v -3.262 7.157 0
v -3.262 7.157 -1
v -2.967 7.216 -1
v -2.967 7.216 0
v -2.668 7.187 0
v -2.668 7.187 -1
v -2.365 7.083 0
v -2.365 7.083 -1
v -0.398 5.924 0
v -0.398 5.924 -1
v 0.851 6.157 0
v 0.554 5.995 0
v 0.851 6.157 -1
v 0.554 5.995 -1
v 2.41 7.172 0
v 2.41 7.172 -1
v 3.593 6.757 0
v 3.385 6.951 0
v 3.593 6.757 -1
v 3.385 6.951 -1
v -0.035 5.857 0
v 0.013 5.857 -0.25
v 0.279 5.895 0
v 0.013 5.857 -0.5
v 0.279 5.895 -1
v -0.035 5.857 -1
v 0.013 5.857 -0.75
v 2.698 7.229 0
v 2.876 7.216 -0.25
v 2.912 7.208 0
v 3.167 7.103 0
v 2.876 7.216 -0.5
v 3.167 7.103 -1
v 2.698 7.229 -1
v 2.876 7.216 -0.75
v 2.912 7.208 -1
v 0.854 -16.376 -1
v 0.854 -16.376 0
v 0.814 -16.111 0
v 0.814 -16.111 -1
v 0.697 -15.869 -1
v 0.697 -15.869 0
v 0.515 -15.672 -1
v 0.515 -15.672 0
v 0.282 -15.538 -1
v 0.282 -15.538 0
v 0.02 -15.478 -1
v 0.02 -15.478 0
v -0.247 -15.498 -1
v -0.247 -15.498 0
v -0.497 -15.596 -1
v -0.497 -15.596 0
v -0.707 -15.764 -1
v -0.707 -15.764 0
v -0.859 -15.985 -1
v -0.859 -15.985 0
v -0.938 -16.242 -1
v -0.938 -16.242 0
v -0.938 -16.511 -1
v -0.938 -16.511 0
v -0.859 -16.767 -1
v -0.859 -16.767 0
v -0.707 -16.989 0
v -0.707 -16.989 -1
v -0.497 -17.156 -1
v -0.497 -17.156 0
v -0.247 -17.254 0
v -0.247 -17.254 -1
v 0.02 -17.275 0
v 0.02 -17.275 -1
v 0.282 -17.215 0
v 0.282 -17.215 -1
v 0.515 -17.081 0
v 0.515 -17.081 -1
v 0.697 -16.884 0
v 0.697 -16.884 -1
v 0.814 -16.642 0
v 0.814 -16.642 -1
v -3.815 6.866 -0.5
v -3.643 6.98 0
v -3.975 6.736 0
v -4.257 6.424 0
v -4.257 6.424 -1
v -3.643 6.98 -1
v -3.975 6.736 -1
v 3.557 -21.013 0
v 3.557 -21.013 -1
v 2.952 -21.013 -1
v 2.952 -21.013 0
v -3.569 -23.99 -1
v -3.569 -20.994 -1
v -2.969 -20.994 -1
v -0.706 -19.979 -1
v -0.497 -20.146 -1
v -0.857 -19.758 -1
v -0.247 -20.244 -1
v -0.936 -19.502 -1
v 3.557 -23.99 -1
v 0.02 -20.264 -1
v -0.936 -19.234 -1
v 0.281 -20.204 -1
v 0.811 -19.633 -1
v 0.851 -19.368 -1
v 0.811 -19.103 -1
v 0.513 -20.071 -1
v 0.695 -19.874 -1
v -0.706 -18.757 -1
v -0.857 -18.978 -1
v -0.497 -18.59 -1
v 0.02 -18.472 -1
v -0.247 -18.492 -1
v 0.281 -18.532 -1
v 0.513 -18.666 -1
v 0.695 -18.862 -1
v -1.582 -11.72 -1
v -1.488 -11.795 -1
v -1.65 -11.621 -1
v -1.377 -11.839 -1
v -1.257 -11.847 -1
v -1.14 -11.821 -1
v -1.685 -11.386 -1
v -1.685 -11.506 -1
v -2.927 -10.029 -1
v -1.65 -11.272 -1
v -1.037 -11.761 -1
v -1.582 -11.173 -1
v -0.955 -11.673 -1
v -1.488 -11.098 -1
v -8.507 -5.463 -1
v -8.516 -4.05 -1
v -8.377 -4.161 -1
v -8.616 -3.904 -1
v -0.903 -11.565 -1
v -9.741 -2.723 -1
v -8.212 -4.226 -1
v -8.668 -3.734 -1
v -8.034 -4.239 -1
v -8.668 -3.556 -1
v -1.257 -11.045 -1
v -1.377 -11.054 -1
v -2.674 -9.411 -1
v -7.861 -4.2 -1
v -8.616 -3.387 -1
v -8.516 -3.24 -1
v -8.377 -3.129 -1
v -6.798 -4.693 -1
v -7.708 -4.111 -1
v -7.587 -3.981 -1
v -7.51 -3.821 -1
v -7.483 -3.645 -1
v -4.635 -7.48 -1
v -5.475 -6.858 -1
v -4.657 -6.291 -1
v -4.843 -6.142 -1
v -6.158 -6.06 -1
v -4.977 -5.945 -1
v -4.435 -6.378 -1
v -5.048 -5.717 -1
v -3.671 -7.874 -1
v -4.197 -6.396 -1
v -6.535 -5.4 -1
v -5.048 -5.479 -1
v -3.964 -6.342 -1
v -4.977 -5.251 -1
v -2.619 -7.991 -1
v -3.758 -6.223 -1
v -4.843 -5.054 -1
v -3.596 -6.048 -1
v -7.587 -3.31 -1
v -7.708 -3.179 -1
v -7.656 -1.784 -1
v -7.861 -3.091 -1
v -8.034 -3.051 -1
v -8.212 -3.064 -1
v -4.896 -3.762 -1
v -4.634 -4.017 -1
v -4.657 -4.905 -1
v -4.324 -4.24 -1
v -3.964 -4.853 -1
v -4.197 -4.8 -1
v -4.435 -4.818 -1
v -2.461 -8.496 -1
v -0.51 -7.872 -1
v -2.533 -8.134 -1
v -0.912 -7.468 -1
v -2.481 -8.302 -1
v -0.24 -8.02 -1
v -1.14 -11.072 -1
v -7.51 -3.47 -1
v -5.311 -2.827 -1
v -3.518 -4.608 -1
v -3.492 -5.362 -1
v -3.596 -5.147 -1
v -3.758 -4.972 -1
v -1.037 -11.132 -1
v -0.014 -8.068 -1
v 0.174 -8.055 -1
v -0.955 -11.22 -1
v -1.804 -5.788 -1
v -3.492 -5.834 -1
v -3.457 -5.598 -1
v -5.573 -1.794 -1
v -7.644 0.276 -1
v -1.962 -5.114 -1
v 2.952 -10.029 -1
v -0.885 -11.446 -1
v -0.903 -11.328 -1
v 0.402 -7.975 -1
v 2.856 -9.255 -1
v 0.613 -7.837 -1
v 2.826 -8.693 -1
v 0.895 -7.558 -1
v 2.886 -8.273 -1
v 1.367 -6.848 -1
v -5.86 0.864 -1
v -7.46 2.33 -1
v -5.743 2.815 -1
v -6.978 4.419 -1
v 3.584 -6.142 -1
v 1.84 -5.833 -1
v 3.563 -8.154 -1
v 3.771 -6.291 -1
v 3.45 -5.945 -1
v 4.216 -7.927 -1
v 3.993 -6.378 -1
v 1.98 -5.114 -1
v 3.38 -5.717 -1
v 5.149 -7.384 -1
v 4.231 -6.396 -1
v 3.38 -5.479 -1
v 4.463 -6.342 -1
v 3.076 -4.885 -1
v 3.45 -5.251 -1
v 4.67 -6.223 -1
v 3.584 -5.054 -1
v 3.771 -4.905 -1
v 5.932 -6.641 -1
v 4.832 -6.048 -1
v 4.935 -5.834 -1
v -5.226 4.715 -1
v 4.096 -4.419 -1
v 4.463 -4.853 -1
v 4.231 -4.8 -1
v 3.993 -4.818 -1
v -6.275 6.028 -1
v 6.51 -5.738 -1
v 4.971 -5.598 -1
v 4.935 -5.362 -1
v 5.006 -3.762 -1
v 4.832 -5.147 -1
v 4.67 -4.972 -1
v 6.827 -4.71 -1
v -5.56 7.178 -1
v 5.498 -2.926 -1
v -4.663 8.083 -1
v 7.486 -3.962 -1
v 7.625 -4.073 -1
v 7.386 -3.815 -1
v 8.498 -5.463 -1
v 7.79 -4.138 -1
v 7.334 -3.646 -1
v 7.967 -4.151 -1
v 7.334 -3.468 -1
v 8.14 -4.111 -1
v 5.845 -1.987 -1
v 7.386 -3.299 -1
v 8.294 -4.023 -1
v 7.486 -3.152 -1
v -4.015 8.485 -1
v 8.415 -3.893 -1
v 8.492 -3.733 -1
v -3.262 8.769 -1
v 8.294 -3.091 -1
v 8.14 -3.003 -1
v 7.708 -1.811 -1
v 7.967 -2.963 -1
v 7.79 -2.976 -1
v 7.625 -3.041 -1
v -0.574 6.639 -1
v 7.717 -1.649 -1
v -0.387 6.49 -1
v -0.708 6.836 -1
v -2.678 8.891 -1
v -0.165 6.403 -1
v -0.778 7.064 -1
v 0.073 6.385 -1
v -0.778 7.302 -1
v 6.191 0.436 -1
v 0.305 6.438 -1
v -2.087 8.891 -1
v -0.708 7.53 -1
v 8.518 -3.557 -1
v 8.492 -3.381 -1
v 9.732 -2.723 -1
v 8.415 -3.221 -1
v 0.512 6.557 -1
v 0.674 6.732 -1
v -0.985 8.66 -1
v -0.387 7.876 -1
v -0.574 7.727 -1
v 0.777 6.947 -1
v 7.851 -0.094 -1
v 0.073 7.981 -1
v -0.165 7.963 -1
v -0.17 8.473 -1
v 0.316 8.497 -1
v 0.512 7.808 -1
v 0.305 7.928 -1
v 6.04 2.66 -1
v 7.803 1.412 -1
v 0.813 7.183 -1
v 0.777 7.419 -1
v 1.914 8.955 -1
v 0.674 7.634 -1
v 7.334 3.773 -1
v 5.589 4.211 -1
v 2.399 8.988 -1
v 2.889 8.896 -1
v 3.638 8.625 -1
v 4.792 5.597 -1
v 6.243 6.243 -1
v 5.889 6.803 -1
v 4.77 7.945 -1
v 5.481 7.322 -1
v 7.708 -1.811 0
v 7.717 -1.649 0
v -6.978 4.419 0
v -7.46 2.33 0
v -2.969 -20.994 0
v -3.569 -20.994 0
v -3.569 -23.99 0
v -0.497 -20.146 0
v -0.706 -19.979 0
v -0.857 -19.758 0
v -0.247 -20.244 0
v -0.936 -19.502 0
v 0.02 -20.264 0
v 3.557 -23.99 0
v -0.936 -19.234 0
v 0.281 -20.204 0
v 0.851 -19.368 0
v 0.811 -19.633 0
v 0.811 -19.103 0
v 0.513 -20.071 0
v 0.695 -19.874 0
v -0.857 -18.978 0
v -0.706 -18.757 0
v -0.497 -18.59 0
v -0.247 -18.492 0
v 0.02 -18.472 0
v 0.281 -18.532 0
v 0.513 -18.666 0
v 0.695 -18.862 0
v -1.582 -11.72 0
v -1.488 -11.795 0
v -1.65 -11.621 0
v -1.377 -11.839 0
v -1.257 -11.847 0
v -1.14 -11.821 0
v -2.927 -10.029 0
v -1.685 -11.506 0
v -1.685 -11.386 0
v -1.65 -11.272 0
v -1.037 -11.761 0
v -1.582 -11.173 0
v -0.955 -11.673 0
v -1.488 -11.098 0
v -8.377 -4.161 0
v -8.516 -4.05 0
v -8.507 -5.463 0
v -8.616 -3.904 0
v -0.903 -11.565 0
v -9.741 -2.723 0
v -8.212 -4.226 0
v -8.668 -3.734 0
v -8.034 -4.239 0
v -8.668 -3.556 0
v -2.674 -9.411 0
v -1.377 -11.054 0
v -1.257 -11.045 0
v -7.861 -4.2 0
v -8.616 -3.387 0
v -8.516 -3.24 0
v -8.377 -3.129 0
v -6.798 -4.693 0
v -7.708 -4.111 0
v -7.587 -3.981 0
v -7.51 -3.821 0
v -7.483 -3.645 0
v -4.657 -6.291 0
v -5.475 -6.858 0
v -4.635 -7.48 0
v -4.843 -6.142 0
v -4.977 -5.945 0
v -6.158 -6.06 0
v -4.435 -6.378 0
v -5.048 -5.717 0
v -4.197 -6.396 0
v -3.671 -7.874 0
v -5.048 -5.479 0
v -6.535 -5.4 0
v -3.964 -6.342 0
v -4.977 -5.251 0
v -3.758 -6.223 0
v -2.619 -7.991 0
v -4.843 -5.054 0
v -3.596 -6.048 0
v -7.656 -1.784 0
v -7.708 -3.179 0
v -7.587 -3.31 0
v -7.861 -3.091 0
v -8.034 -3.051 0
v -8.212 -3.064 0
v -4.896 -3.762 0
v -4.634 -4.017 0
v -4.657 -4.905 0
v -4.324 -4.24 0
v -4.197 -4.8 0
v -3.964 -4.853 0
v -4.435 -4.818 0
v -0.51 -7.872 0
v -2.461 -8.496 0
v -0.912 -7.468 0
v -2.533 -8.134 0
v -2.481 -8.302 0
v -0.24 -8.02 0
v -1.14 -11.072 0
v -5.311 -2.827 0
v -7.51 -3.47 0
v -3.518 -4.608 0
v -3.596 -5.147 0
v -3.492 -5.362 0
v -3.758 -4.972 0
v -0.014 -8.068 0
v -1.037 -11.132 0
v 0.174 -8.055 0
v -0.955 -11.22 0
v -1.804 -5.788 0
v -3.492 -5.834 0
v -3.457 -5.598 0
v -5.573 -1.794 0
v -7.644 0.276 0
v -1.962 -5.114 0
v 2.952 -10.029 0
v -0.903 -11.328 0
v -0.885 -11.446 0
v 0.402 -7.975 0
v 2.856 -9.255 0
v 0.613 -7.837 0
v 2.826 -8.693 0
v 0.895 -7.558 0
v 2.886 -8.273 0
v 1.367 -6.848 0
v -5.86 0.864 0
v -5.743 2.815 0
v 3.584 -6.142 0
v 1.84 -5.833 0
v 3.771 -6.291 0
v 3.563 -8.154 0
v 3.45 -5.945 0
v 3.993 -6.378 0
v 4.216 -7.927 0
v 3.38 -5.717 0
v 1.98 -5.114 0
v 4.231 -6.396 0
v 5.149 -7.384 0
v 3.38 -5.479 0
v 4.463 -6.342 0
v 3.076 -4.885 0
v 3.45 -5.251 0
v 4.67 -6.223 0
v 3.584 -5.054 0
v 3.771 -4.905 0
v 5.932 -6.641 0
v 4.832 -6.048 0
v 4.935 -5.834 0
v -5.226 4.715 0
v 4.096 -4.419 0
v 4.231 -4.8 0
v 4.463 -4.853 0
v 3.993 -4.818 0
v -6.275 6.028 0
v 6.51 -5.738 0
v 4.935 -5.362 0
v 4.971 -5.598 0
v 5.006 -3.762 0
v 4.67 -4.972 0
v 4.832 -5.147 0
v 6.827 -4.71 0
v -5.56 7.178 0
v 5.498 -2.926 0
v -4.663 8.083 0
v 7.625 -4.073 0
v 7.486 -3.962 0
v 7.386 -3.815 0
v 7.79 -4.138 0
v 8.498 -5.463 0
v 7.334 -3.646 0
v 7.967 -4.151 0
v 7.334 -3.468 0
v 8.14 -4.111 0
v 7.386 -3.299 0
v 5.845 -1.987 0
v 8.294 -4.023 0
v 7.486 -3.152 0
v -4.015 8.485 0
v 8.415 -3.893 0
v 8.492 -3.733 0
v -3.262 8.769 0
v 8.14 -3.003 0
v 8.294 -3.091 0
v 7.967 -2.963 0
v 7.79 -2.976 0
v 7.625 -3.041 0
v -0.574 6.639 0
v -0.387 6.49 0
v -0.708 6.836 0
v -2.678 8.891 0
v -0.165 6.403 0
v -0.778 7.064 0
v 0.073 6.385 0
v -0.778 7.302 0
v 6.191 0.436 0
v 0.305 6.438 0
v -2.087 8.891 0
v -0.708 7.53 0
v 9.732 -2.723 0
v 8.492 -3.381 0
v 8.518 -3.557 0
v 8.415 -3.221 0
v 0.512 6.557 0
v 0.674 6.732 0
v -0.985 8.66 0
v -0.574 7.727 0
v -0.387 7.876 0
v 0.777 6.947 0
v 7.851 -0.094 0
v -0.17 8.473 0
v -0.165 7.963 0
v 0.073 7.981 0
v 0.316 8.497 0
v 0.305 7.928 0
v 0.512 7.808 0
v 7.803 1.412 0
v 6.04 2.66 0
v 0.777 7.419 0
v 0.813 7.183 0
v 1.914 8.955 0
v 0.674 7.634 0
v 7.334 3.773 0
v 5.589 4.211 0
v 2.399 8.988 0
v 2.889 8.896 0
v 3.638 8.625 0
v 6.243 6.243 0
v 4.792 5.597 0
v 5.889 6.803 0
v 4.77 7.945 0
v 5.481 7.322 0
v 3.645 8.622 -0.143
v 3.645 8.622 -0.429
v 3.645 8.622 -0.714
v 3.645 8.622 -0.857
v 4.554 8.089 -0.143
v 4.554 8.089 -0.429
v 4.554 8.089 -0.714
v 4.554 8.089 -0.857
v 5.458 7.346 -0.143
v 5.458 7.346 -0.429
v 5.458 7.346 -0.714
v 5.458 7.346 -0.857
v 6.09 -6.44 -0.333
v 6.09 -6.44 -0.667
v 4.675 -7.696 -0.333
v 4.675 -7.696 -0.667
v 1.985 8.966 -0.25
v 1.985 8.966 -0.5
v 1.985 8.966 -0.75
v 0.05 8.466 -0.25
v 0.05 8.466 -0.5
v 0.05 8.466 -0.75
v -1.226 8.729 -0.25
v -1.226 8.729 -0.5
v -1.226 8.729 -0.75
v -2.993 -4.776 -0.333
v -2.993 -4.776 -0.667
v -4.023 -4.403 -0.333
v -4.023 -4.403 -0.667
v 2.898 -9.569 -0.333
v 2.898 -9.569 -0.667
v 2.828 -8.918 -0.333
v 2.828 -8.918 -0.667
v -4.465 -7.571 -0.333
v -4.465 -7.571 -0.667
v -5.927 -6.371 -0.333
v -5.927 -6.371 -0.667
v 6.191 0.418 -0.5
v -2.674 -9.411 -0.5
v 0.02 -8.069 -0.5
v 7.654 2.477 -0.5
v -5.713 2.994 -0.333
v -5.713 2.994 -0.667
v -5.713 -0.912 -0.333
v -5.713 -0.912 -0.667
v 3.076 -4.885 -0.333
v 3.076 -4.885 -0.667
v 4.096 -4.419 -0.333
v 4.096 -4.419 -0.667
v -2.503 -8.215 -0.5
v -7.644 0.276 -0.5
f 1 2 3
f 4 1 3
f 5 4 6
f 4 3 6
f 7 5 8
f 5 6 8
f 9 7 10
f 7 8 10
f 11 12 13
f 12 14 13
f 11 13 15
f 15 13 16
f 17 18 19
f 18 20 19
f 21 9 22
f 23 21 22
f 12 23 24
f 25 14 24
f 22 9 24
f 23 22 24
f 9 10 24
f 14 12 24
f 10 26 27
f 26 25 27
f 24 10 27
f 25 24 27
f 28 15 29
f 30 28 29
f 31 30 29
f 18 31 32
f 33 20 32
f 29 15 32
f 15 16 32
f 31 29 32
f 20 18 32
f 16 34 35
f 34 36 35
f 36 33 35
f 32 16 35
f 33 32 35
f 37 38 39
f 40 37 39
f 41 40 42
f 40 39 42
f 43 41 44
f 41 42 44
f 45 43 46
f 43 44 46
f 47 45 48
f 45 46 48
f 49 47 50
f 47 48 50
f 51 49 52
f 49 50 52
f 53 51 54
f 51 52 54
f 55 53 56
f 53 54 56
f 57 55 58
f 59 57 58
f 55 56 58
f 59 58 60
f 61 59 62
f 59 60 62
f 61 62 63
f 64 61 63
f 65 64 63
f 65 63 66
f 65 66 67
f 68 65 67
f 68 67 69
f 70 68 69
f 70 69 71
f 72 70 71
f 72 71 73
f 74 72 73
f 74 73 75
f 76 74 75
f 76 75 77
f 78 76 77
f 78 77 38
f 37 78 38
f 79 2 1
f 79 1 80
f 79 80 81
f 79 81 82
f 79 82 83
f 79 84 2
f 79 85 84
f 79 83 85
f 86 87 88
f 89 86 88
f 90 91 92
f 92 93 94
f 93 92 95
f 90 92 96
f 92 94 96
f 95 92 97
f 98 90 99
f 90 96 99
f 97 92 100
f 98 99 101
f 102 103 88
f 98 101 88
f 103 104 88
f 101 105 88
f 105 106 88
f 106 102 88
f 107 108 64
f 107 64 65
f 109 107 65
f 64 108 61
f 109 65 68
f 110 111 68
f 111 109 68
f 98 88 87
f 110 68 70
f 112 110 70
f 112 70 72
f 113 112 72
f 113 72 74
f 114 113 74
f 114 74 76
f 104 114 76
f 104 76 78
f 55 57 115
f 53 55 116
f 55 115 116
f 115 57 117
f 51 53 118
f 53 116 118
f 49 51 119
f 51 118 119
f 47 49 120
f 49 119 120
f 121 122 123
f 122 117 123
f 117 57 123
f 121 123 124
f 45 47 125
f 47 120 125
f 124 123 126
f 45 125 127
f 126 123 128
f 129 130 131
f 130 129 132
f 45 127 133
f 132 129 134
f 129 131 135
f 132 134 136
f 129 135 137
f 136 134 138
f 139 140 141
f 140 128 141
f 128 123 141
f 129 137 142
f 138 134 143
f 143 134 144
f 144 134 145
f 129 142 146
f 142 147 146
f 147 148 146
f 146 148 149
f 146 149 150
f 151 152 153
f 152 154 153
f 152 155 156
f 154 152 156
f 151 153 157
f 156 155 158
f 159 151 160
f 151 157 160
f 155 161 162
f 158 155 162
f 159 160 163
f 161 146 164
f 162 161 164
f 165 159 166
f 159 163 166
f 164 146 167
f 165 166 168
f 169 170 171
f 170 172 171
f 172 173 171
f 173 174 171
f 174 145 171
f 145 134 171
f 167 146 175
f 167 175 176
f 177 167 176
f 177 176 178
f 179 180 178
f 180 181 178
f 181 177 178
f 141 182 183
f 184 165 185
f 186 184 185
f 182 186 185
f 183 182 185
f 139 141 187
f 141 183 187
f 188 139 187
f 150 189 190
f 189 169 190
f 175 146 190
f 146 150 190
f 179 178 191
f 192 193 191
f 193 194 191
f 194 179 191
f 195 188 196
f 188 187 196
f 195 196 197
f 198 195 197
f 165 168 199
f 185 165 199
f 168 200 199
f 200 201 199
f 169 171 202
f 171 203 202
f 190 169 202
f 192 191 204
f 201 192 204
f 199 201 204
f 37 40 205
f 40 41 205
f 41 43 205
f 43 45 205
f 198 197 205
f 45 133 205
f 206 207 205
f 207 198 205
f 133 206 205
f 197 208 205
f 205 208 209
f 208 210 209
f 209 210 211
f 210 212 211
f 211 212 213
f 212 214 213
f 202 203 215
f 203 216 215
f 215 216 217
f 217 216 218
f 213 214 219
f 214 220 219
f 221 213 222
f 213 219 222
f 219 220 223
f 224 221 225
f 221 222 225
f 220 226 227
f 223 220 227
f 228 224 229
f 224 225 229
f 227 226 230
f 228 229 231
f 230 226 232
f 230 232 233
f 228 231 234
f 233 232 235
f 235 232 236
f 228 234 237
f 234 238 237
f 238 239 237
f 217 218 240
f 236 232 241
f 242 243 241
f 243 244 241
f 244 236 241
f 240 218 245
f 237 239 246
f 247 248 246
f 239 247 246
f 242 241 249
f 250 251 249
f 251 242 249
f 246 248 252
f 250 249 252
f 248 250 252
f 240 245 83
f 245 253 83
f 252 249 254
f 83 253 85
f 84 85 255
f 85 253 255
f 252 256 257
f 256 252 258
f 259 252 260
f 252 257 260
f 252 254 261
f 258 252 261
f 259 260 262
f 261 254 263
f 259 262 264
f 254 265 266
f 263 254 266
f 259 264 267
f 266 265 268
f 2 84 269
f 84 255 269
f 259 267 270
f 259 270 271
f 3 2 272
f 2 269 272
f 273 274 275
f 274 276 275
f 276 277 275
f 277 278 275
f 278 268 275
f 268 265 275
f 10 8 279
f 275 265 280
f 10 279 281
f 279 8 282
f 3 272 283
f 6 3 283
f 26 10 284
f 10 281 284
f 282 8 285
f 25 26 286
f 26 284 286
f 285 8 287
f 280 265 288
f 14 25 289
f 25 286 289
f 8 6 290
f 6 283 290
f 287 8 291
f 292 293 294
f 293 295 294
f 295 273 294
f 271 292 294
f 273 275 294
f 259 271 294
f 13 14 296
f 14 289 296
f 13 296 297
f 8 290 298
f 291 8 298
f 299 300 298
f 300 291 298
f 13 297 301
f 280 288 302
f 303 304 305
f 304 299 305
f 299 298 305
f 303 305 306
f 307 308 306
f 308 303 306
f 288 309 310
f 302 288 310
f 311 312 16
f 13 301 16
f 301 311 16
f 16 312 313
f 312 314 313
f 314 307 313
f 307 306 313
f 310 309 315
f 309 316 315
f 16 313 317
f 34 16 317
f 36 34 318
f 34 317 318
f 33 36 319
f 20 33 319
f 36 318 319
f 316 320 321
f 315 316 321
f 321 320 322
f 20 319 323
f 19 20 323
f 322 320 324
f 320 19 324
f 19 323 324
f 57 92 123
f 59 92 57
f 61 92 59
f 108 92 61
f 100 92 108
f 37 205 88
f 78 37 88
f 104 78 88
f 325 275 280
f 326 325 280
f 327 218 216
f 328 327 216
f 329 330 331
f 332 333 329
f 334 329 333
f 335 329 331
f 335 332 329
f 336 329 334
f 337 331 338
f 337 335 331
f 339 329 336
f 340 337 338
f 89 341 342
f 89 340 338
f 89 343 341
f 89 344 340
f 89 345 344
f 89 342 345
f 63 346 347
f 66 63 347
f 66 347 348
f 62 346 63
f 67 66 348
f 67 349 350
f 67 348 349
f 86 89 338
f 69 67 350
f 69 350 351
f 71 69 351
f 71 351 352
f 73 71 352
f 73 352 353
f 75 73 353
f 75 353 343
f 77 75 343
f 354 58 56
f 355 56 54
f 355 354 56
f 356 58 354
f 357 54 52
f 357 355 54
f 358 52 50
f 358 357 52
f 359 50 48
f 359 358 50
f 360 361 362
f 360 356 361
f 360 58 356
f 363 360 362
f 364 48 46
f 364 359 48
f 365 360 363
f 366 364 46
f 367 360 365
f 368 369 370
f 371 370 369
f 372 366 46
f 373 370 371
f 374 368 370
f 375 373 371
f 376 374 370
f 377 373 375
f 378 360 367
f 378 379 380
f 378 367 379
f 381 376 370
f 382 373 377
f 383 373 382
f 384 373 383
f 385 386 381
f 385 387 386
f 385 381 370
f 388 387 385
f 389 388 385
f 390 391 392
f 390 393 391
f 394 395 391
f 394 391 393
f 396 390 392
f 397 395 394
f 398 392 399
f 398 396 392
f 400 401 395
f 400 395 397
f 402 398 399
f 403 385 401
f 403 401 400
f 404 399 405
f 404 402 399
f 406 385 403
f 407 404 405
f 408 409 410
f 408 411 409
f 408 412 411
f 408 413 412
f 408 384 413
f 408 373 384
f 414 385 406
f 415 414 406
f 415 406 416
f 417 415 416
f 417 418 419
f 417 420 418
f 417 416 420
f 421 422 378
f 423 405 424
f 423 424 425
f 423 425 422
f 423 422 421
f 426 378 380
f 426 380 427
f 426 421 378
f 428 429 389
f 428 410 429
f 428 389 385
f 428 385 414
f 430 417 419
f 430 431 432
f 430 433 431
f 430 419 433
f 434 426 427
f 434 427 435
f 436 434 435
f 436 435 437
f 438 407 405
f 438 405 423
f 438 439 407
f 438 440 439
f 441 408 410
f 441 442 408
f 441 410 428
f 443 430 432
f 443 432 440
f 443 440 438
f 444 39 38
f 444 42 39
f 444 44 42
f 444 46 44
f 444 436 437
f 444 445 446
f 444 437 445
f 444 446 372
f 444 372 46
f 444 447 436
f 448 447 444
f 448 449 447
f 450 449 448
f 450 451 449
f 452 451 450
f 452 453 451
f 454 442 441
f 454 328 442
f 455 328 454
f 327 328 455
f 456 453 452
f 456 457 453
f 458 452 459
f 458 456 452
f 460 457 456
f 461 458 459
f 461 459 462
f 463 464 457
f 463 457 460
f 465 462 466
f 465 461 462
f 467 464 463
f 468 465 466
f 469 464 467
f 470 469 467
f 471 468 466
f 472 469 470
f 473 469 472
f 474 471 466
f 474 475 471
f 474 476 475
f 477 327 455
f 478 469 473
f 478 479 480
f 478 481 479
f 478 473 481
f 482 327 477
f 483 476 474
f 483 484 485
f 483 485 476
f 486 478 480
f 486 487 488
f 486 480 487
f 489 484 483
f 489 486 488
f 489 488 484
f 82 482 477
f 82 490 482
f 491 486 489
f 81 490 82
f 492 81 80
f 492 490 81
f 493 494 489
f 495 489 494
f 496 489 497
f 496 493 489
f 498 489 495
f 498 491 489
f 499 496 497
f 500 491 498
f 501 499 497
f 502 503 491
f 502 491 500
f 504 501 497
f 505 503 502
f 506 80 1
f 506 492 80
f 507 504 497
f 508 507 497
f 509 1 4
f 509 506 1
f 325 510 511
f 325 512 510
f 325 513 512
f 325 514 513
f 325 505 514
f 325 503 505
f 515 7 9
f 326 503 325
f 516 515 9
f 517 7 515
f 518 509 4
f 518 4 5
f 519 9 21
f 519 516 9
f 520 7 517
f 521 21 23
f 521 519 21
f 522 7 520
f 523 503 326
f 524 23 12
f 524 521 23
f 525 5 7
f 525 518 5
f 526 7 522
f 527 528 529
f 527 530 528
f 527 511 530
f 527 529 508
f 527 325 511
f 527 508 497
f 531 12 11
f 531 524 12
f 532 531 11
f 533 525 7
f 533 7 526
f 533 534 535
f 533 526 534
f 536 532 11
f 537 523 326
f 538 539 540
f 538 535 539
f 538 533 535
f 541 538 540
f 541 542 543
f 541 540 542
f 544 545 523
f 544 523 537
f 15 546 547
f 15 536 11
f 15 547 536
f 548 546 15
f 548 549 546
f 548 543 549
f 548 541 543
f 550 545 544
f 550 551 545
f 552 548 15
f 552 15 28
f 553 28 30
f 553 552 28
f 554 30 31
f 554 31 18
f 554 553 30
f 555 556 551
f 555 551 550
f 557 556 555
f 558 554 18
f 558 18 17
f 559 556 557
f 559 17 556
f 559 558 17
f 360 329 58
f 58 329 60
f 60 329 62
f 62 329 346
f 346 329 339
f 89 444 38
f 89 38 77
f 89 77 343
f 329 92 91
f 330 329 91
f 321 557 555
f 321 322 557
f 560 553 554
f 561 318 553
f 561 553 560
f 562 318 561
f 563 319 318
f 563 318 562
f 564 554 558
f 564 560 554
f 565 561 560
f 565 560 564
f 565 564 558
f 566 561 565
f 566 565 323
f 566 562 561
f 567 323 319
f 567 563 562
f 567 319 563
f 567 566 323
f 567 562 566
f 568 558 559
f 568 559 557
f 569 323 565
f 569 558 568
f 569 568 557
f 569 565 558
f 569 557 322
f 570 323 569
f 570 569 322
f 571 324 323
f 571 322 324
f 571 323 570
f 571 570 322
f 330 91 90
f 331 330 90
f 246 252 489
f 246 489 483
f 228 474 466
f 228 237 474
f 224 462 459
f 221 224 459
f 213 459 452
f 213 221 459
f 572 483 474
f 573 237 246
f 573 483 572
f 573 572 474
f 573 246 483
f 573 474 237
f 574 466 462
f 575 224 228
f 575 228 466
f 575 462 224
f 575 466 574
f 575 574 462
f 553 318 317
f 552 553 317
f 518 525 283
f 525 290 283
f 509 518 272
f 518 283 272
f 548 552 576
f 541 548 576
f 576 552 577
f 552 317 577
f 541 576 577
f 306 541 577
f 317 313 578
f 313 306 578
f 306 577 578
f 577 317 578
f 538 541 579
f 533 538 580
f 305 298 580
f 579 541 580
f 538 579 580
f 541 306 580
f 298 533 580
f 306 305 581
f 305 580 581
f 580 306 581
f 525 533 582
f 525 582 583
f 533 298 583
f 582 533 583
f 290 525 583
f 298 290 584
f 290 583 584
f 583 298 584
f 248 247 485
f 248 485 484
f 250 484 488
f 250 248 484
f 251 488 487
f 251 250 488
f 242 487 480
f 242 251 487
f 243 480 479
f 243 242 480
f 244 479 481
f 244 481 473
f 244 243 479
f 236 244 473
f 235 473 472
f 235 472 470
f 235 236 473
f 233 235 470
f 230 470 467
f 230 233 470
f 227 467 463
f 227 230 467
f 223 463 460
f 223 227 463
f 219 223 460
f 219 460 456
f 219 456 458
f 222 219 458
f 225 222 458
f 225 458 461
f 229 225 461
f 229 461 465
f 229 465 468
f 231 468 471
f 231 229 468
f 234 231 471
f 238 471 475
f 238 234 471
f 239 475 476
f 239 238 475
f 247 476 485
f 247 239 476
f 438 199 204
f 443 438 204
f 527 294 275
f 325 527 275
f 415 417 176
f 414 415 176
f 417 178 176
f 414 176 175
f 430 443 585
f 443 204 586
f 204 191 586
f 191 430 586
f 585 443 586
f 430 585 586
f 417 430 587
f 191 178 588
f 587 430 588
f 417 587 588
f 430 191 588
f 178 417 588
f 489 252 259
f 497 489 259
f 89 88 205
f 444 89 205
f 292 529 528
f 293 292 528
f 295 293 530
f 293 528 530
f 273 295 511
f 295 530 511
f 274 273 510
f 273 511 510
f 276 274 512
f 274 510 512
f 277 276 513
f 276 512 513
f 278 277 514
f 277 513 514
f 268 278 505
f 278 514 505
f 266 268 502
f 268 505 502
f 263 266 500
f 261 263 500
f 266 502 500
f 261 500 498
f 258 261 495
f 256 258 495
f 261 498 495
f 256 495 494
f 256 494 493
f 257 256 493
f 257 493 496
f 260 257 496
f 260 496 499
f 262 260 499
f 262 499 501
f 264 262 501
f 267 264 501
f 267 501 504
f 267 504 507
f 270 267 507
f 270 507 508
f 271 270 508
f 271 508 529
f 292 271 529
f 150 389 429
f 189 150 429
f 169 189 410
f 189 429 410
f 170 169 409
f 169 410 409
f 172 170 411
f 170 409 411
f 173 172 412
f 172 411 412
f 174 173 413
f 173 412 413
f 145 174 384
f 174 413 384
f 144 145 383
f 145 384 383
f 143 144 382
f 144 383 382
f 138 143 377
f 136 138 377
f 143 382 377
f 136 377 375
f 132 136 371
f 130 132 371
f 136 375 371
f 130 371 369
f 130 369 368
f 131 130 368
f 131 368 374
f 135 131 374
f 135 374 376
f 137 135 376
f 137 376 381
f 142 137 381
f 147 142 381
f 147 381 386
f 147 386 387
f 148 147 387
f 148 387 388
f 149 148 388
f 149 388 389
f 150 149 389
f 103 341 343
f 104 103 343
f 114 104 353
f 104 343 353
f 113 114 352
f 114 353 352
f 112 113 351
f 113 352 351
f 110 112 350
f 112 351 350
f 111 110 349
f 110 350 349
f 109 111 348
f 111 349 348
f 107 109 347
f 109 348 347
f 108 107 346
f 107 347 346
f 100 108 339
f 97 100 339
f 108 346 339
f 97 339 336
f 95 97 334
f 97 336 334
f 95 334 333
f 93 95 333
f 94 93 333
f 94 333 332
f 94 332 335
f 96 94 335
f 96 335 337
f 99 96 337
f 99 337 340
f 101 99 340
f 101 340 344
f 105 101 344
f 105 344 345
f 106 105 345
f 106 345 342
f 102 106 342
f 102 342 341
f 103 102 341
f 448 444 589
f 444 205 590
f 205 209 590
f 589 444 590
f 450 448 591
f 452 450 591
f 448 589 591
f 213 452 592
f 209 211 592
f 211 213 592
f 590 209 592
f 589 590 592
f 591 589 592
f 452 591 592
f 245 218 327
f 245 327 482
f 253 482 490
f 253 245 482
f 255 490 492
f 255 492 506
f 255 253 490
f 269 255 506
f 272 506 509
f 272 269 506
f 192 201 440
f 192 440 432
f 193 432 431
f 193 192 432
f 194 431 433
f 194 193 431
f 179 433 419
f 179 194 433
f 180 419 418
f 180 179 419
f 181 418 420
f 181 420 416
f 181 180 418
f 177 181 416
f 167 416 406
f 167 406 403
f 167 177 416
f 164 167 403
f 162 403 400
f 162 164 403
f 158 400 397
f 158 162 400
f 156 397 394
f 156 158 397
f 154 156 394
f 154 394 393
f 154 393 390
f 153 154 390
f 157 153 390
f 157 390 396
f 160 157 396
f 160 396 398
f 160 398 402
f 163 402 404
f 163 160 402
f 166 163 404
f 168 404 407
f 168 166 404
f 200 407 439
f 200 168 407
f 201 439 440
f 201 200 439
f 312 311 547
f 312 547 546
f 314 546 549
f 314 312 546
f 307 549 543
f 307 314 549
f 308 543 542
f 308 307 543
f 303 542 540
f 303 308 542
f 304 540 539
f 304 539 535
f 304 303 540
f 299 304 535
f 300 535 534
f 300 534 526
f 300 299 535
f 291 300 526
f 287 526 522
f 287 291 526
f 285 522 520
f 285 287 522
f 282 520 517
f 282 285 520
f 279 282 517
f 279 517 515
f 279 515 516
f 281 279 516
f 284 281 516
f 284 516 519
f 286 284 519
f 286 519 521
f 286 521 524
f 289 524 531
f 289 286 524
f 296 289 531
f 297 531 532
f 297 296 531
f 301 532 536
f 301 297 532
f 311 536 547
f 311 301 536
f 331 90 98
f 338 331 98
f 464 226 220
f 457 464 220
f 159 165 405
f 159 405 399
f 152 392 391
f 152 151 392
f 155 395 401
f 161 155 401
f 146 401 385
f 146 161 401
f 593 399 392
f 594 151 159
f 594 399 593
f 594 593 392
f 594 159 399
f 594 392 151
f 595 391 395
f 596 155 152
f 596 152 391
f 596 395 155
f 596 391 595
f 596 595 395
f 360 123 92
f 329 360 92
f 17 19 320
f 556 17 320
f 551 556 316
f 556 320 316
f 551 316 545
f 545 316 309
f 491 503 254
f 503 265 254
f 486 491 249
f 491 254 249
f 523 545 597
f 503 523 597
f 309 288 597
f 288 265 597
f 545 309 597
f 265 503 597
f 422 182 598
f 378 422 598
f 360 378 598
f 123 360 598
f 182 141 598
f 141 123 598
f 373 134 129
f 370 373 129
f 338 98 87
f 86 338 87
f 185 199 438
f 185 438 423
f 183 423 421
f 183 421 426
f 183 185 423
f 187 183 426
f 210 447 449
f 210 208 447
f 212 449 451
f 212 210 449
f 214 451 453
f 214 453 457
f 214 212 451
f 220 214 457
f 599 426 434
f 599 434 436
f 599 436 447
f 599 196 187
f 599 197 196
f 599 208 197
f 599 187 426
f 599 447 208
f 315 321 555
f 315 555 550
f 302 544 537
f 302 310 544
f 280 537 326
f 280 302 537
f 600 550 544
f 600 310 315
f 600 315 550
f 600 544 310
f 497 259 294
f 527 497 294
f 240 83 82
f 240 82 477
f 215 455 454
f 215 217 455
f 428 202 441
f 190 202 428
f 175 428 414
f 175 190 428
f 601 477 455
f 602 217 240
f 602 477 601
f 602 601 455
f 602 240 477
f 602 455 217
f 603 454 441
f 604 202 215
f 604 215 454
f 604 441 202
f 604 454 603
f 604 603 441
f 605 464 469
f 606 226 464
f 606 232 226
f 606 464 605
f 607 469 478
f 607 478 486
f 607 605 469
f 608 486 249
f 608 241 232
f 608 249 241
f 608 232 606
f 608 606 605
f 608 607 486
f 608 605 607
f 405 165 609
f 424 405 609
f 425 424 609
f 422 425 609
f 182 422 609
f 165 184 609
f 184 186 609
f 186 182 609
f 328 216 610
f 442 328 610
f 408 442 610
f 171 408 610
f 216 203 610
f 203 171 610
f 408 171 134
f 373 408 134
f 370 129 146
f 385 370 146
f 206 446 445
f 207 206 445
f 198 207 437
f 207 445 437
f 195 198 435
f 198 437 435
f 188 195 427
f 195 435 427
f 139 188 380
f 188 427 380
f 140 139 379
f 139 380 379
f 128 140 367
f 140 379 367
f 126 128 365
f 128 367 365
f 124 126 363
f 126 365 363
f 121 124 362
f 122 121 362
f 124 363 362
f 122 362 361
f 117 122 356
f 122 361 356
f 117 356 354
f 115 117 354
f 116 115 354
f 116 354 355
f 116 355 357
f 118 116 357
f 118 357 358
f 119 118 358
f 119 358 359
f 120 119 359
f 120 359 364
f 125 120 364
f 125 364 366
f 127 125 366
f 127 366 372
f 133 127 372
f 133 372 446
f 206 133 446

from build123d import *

# Parameters (mm, degrees)
BOSS_EXTRUDE1_START   = -1
SKETCH1_R             = 0.8
BOSS_EXTRUDE1_DEPTH   = 1
SKETCH7_R             = 0.898548633
SKETCH7_R_2           = 0.900820611
SKETCH7_R_3           = 0.402256278
CUT_EXTRUDE9_DEPTH    = 10
F_0_80_TAPPED_HOLE2_D = 1.19126
F_0_80_TAPPED_HOLE3_D = 1.19126


with BuildPart() as part:
    # Sketch1 → Boss-Extrude1 (new body)
    with BuildSketch(Plane.XY.offset(BOSS_EXTRUDE1_START)):
        with BuildLine():
            Line((-7.655924922, -1.783859884), (-9.740911438, -2.722813484))
            Line((-9.740911438, -2.722813484), (-8.506978823, -5.462813484))
            Line((-8.506978823, -5.462813484), (-6.79791054, -4.69315104))
            add(Edge.make_bspline(
                [(-2.619308836, -7.990994312), (-4.588919021, -8.061513983), (-6.291403266, -6.510208965), (-6.79791054, -4.69315104)],
                knots=[0, 0, 0, 0, 1, 1, 1, 1], degree=3))
            add(Edge.make_bspline(
                [(-2.619308836, -7.990994312), (-2.465518072, -8.186748708), (-2.460868626, -8.496086459)],
                knots=[0.760656089, 0.760656089, 0.760656089, 1, 1, 1], degree=2))
            add(Edge.make_bspline(
                [(-2.460868626, -8.496086459), (-2.65493709, -9.55970155), (-2.927067031, -10.028695592)],
                knots=[0.505400696, 0.505400696, 0.505400696, 1, 1, 1], degree=2))
            Line((-2.927067031, -10.028695592), (-2.968919318, -20.993587767))
            Line((-2.968919318, -20.993587767), (-3.569337553, -20.993587767))
            Line((-3.569337553, -20.993587767), (-3.569337553, -23.990261353))
            Line((-3.569337553, -23.990261353), (3.556946411, -23.990261353))
            Line((3.556946411, -23.990261353), (3.556946411, -21.012656051))
            Line((3.556946411, -21.012656051), (2.952210653, -21.012656051))
            Line((2.952210653, -21.012656051), (2.952210653, -10.028695592))
            add(Edge.make_bspline(
                [(2.952210653, -10.028695592), (2.953361032, -9.730287058), (2.715766736, -8.848177203), (2.885688703, -8.273229584)],
                knots=[0, 0, 0, 0, 0.672395154, 0.672395154, 0.672395154, 0.672395154], degree=3))
            add(Edge.make_bspline(
                [(6.826829986, -4.71005972), (6.530666267, -6.607497463), (4.761489994, -8.103944733), (2.885688703, -8.273229584)],
                knots=[0, 0, 0, 0, 1, 1, 1, 1], degree=3))
            Line((6.826829986, -4.71005972), (8.498351825, -5.462813484))
            Line((8.498351825, -5.462813484), (9.73228444, -2.722813484))
            Line((9.73228444, -2.722813484), (7.707819022, -1.811114978))
            Line((7.707819022, -1.811114978), (7.717081791, -1.649283667))
            add(Edge.make_bspline(
                [(6.242730234, 6.243460256), (8.328472862, 2.657233336), (7.717081791, -1.649283667)],
                knots=[0, 0, 0, 1, 1, 1], degree=2))
            add(Edge.make_bspline(
                [(2.888581262, 8.896214027), (2.985217378, 8.879515932), (3.247765026, 8.808593113), (3.630118411, 8.642577), (4.074173184, 8.36866418), (4.721906948, 8.009989726), (5.550196572, 7.346039296), (6.012892554, 6.633136043), (6.242724869, 6.243469352), (6.242730234, 6.243460256)],
                knots=[0.680120302, 0.680120302, 0.680120302, 0.680120302, 0.700211116, 0.734681827, 0.764415496, 0.805837959, 0.884920242, 0.976406366, 0.976408502, 0.976408502, 0.976408502, 0.976408502], degree=3))
            add(Edge.make_bspline(
                [(2.888581262, 8.896214027), (2.280334466, 9.102116147), (1.335962581, 8.833175098), (-0.021268554, 8.319279629), (-1.467178457, 8.865773987), (-2.595326146, 8.990746146), (-3.261769012, 8.769028641)],
                knots=[0, 0, 0, 0, 0.291998369, 0.463731226, 0.671653294, 1, 1, 1, 1], degree=3))
            add(Edge.make_bspline(
                [(-6.978349655, 4.418537245), (-6.978341175, 4.418559118), (-6.261281728, 6.267997055), (-5.356361794, 8.204922518), (-3.261769012, 8.769028641)],
                knots=[0.183710391, 0.183710391, 0.183710391, 0.183710391, 0.183719842, 0.982772692, 0.982772692, 0.982772692, 0.982772692], degree=3))
            Line((-6.978349655, 4.418537245), (-7.459962837, 2.329545769))
            add(Edge.make_bspline(
                [(-7.459962837, 2.329545769), (-7.730690273, 0.280095873), (-7.655924922, -1.783859884)],
                knots=[0, 0, 0, 1, 1, 1], degree=2))
        make_face()
        with Locations((-4.256541488, -5.597749713)):
            Circle(SKETCH1_R, mode=Mode.SUBTRACT)
        with Locations((4.170722828, -5.597749713)):
            Circle(SKETCH1_R, mode=Mode.SUBTRACT)
        with BuildLine():
            add(Edge.make_bspline(
                [(-1.804027034, -5.787976133), (0.02164308, -10.328457974), (1.839505032, -5.833009783)],
                knots=[0, 0, 0, 1, 1, 1], degree=2))
            Line((-1.804027034, -5.787976133), (-1.962380096, -5.114496208))
            add(Edge.make_bspline(
                [(-1.962380096, -5.114496208), (-2.941705535, -4.714827932), (-4.153358989, -4.614522903), (-4.895639487, -3.761606791)],
                knots=[0, 0, 0, 0, 1, 1, 1, 1], degree=3))
            add(Edge.make_bspline(
                [(-4.256541488, 6.424442026), (-5.024773734, 5.435848631), (-5.987106297, 2.960839001), (-5.849347194, -0.56805471), (-5.37593872, -2.947032062), (-4.895639487, -3.761606791)],
                knots=[0, 0, 0, 0, 0.272445914, 0.556070127, 0.771313395, 0.771313395, 0.771313395, 0.771313395], degree=3))
            add(Edge.make_bspline(
                [(-3.261769012, 7.15739827), (-3.8717566, 6.941904365), (-4.256541488, 6.424442026)],
                knots=[0, 0, 0, 1, 1, 1], degree=2))
            add(Edge.make_bspline(
                [(-3.261769012, 7.15739827), (-3.163039034, 7.19003027), (-2.117380019, 7.410646221), (0.07712388, 4.390116457), (2.247368009, 7.809908036), (3.370301543, 6.988790875), (3.593464255, 6.757042923)],
                knots=[0.223669574, 0.223669574, 0.223669574, 0.223669574, 0.250320471, 0.504380952, 0.76319614, 0.835276292, 0.835276292, 0.835276292, 0.835276292], degree=3))
            add(Edge.make_bspline(
                [(3.593464255, 6.757042923), (5.644175861, 5.268051013), (6.650840286, 1.422043117), (5.831780767, -2.644018853), (5.005569013, -3.761606791)],
                knots=[0, 0, 0, 0, 0.480405077, 0.775338814, 0.775338814, 0.775338814, 0.775338814], degree=3))
            add(Edge.make_bspline(
                [(1.979863992, -5.114496208), (3.102537491, -5.017783712), (4.162687131, -4.499401159), (5.005569013, -3.761606791)],
                knots=[0, 0, 0, 0, 1, 1, 1, 1], degree=3))
            Line((1.979863992, -5.114496208), (1.839505032, -5.833009783))
        make_face(mode=Mode.SUBTRACT)
        with Locations((0.012809238, 7.182899015)):
            Circle(SKETCH1_R, mode=Mode.SUBTRACT)
    extrude(amount=BOSS_EXTRUDE1_DEPTH)

    # Sketch7 → Cut-Extrude9 (cut)
    with BuildSketch(Plane.XY):
        with Locations((-0.047392103, -19.368039034)):
            Circle(SKETCH7_R)
        with Locations((-0.046989341, -16.376260671)):
            Circle(SKETCH7_R_2)
        with Locations((-1.287320407, -11.446362098)):
            Circle(SKETCH7_R_3)
    extrude(amount=-CUT_EXTRUDE9_DEPTH, mode=Mode.SUBTRACT)

    # #0-80 Tapped Hole2 (through all)
    with Locations(Plane(origin=(0, 0, -1), x_dir=(-1, 0, 0), z_dir=(0, 0, -1))):
        with Locations((-7.922698165, -3.556993775)):
            Hole(F_0_80_TAPPED_HOLE2_D / 2)

    # #0-80 Tapped Hole3 (through all)
    with Locations(Plane(origin=(0, 0, -1), x_dir=(-1, 0, 0), z_dir=(0, 0, -1))):
        with Locations((8.078988794, -3.645070301)):
            Hole(F_0_80_TAPPED_HOLE3_D / 2)


solid = part.part
